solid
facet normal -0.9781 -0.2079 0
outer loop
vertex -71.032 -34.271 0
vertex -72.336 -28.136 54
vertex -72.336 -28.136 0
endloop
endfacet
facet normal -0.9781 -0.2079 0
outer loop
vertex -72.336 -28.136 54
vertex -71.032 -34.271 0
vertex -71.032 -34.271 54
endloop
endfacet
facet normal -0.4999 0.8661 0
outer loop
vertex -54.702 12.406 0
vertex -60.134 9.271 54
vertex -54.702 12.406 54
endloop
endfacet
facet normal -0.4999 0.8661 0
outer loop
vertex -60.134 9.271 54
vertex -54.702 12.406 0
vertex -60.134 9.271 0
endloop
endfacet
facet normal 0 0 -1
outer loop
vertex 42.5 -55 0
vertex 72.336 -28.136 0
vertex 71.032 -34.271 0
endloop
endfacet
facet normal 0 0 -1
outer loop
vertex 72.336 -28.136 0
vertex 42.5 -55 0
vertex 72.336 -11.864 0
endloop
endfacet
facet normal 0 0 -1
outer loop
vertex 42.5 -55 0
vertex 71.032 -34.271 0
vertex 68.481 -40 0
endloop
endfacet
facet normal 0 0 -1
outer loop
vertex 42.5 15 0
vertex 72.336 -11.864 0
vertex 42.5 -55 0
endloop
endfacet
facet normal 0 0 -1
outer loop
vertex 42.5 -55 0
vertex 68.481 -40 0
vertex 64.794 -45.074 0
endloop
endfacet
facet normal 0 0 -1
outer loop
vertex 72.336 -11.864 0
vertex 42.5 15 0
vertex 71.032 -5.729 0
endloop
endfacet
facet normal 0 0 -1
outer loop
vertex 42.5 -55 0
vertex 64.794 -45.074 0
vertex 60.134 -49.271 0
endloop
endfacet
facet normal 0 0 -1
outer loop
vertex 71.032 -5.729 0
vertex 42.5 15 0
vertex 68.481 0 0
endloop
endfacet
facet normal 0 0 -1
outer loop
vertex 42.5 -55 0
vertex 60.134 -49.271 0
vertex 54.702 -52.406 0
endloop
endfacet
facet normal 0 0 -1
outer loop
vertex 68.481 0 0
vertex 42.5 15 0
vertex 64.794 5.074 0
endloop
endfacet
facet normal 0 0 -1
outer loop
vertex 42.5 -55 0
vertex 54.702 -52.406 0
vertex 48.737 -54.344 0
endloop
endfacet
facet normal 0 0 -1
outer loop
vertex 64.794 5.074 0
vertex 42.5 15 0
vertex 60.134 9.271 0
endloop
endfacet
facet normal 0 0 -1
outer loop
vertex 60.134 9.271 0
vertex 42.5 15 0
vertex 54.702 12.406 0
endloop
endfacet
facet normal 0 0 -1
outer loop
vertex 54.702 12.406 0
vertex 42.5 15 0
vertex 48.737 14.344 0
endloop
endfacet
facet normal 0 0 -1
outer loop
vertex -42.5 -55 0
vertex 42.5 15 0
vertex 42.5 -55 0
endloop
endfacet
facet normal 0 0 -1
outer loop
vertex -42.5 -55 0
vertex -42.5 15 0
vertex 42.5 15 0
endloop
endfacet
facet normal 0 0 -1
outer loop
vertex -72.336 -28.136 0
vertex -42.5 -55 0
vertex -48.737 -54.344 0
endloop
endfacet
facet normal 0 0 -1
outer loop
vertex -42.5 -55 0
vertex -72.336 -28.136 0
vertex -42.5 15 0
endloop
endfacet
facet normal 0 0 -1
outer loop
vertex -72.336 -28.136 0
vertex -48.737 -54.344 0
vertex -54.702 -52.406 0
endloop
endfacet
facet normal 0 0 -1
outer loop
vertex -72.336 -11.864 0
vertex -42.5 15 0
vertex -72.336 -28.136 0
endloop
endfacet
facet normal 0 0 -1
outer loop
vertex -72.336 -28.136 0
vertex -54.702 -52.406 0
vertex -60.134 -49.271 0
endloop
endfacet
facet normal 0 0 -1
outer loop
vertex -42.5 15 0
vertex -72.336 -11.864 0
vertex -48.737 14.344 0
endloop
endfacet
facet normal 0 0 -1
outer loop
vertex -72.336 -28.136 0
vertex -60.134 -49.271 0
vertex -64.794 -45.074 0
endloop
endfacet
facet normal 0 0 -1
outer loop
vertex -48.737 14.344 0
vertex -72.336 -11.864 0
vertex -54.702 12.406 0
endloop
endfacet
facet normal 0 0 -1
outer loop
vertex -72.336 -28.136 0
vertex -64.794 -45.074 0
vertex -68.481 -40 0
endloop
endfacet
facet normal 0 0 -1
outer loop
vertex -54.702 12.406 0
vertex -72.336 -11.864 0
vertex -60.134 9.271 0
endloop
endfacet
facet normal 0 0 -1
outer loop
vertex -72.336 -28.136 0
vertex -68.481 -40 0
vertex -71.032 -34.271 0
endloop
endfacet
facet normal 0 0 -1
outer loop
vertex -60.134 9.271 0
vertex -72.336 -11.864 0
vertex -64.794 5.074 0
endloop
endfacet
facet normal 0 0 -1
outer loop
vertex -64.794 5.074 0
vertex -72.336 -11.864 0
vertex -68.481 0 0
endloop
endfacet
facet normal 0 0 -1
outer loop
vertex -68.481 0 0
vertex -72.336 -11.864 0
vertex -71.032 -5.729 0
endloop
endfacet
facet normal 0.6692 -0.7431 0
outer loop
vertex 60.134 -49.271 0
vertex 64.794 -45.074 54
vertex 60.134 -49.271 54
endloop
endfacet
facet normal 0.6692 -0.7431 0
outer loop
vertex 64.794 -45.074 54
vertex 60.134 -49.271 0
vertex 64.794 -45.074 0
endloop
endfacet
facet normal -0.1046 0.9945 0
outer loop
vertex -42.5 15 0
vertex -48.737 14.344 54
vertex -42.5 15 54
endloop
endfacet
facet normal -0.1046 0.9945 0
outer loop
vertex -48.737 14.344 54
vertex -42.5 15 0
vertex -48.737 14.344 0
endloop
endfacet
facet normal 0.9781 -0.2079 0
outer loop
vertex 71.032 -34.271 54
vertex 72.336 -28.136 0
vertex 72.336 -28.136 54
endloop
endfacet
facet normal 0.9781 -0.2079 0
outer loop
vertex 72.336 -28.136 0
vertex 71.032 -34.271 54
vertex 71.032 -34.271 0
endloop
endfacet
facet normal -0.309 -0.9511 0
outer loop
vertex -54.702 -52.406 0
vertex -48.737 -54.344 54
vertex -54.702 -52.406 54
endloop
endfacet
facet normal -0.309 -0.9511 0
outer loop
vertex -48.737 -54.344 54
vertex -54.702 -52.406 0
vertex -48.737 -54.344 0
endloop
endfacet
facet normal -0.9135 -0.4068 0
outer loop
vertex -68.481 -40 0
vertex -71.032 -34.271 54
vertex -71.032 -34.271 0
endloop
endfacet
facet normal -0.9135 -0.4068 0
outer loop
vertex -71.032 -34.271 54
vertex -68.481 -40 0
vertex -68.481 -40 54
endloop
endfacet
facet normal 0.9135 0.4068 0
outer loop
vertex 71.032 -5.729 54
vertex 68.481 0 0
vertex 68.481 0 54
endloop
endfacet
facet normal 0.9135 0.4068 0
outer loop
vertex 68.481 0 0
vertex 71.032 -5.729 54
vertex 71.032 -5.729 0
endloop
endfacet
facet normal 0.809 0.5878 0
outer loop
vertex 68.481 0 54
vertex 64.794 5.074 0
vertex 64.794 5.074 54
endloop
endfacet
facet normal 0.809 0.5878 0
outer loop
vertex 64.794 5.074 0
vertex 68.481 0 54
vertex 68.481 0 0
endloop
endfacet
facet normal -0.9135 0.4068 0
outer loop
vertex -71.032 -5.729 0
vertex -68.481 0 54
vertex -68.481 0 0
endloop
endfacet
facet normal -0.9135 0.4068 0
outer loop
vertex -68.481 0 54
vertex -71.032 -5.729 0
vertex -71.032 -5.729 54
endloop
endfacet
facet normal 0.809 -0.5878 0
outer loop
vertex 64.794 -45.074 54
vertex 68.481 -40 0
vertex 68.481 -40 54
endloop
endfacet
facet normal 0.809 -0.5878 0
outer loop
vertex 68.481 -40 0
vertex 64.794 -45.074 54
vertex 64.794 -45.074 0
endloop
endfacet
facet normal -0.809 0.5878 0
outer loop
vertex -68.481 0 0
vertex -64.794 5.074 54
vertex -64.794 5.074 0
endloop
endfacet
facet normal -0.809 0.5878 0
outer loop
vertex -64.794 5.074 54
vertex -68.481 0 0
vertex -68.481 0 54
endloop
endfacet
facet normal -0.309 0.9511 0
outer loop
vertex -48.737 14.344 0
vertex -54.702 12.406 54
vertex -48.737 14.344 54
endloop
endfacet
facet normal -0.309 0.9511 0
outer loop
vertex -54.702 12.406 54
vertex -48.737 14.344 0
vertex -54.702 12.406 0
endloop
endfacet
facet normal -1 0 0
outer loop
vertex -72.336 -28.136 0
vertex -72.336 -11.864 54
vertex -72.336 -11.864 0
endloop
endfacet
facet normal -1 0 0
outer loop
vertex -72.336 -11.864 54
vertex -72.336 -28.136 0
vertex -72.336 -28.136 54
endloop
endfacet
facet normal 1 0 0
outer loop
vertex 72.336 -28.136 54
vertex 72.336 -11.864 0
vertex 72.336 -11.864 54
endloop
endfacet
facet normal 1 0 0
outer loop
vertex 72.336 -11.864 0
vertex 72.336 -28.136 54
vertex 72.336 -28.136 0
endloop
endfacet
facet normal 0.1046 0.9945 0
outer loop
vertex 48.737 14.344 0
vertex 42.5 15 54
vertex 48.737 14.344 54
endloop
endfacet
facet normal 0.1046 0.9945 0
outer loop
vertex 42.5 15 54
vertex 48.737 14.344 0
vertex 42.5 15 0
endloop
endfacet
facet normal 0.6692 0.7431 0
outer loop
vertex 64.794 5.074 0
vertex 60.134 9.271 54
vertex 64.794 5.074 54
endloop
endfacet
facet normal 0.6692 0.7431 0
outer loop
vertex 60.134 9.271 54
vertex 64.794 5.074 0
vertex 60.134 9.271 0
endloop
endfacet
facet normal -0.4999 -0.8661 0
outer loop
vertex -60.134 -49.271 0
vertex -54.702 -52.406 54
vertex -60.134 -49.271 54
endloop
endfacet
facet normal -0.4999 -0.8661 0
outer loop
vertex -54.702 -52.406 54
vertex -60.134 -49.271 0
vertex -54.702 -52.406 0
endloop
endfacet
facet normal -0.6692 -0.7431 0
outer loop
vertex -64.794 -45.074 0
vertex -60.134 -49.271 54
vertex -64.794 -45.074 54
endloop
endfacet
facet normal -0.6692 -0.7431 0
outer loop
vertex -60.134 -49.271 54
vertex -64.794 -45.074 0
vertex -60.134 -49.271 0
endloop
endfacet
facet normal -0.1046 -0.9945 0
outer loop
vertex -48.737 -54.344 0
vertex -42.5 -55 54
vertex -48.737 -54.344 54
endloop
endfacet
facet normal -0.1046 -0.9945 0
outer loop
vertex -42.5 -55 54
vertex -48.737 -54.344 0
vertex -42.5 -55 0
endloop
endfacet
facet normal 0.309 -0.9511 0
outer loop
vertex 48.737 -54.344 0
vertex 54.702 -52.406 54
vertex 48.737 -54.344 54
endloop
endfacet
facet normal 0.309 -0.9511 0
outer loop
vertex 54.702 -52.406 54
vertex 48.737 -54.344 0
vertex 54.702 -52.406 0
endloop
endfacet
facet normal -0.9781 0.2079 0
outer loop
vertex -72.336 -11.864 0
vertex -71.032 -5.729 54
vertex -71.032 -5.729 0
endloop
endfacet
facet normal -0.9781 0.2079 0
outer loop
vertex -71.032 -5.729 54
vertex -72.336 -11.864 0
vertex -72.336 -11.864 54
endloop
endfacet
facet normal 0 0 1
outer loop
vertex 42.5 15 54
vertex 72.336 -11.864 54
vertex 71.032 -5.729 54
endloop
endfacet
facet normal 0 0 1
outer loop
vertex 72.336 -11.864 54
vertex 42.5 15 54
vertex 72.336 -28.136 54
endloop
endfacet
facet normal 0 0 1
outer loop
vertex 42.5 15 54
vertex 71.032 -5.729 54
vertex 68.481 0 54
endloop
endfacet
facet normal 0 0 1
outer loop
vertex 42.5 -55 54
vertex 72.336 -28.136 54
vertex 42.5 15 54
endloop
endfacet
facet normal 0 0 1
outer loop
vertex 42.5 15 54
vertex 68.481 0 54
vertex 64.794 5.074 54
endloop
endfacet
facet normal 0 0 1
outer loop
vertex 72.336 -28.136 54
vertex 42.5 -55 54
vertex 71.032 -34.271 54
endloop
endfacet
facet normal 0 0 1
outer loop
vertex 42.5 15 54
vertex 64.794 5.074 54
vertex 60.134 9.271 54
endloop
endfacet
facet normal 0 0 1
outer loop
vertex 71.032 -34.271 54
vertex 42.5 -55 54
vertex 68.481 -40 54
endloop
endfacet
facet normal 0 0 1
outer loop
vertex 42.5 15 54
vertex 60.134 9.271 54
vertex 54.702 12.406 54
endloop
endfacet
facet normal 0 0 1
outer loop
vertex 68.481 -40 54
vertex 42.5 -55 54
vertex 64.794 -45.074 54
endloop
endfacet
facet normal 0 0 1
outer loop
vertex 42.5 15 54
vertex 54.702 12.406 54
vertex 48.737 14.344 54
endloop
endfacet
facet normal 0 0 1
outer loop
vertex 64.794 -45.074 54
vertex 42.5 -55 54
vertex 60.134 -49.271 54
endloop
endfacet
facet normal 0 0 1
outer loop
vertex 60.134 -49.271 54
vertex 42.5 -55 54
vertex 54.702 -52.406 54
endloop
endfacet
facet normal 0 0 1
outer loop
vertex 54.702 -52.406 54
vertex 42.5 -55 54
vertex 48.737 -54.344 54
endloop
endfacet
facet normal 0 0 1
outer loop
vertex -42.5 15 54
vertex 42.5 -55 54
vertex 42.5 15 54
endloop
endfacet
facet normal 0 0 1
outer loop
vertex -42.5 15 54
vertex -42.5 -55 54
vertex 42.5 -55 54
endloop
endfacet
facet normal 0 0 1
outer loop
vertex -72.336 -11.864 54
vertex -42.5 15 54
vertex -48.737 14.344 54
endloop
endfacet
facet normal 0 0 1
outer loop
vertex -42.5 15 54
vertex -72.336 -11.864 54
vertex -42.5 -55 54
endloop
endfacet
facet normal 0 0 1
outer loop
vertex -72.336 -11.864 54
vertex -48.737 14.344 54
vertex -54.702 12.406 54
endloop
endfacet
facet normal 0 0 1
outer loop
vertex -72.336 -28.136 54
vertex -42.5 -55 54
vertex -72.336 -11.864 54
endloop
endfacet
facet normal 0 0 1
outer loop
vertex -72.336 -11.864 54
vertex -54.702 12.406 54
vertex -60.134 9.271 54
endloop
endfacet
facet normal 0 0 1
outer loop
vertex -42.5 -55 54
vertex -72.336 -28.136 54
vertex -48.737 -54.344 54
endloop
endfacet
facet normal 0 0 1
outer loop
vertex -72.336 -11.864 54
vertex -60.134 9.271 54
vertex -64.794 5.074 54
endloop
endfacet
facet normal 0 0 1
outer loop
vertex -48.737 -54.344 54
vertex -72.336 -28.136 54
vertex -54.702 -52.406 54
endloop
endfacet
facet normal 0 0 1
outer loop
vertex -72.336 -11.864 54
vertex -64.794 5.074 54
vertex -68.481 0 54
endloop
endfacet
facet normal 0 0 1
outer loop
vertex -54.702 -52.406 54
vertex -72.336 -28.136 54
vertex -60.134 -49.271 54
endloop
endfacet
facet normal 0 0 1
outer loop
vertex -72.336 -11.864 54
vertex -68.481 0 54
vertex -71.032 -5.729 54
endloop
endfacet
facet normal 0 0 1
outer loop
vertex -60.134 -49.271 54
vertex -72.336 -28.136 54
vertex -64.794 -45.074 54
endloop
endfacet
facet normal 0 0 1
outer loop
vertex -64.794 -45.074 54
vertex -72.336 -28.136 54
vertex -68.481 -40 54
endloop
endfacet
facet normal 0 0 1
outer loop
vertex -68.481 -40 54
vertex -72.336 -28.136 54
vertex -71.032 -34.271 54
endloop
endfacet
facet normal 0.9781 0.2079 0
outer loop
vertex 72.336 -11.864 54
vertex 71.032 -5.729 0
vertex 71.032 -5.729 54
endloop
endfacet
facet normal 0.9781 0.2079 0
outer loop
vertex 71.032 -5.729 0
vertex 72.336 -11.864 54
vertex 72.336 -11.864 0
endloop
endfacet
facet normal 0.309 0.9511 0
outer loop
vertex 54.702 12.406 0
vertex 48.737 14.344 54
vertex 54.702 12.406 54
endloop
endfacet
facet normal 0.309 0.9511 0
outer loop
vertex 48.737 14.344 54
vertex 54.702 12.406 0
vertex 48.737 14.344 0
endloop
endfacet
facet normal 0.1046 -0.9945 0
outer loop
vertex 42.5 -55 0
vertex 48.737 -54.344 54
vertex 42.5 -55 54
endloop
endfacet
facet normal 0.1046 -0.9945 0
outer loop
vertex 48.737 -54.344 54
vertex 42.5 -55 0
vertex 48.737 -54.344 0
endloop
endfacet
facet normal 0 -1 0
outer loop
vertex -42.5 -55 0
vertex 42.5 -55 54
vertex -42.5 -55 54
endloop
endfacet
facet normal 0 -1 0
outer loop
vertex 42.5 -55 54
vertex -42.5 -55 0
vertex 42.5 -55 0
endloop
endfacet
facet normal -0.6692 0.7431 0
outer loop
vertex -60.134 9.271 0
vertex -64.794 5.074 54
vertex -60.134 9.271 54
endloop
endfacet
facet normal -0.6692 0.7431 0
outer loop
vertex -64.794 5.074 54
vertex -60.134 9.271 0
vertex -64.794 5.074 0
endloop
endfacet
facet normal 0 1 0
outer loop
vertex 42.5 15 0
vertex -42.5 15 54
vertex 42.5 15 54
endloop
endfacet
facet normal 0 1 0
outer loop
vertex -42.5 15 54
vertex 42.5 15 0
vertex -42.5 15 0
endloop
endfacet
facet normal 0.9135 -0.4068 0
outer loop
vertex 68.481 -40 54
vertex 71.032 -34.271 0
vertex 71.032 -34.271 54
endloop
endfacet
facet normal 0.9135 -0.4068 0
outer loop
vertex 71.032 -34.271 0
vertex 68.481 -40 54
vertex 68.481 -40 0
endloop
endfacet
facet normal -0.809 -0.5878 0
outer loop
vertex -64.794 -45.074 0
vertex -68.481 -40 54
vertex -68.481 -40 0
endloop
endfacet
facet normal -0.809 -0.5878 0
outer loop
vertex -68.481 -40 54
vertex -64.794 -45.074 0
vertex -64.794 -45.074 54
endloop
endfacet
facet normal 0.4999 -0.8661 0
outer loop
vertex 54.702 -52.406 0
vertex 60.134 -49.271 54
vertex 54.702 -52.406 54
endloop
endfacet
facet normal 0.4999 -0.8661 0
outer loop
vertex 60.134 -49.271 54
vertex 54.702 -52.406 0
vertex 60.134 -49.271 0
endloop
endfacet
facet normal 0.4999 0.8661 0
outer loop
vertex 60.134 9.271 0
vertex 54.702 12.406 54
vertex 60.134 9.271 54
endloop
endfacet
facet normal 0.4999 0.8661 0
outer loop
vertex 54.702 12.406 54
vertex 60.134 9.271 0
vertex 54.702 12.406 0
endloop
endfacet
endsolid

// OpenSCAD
/* https://edux.fit.cvut.cz/courses/BI-3DT/classification/openscad-ukol */
/* https://github.com/nesro/nesrotom-3dt-2015 */
/* nesrotom@fit.cvut.cz */

/* comment this out before submission! */
//$fn = 10;

/******************************************************/

/* 1D offset wasn't a good idea */
/*
module line(x) {
    difference() {
    square([x,1],center=true);
    translate([0,0.5,0])
        square([x+0.5,2],center=true);
    }
}
offset(r=+3)
line(10);*/

/* TOHLE NEPOUZIVAM */
/* rounded cube: square + offset + extrude */
/* tohle ale nemuzu pouzit, protoze to nefunguje kdyz je
   y = 0 */
module rcSOE(x,y,z,r) {
    echo("rcSOE x=",x,",\ty=",y,",\tz=",z,",\tr=",r);
    %cube([x+2*r,y+2*r,z], center=true);
    linear_extrude(height=z,center=true,convexity=0,twist=0)
    offset(r=+r)
    square([x,y],center=true);
}

/* TOHLE POUZIVAM (a budu pokud y==0 */
/* rounded cube: 4 cylinders + hull */
module rc4CH(x,y,z,r) {
    echo("rc4CH x=",x,",\ty=",y,",\tz=",z,",\tr=",r);
    %cube([x+2*r,y+2*r,z], center=true);
    hull() {
        for (i=[-1,1])
            for (j=[-1,1])
                translate([(i*x/2),(j*y/2),0]) 
                    cylinder(r=r, h=z, center=true);
    }
}

/* TOHLE ZATIM NEPOUZIVAM */
/* rounded cube: 2 cylinders + cube (WIP!!!) */
module rc2CC(x,y,z,r) {
    echo("rc2CC x=",x,",\ty=",y,",\tz=",z,",\tr=",r);
    %cube([x+2*r,y+2*r,z], center=true);
    
    //d=z+r;
    //cylinder(r=d, h=z, center=true);
    
    cube([x+2*r,y,z], center=true);
    
    color("red")
    translate([0,x+2*r,0]) //FIXME
    cylinder(r=r, h=z, center=true);
    
}

module rc(x,y,z,r) {
    rc4CH(x,y,z,r);
}

/* one card holder */
module ch(x,y,z,s,t,down,v) {
    difference(){
        color("blue")rc(z,x,y,s+t);
        color("red")rc(z,x,y,s);
    }
    //translate([0,0,(-y/2) +t/2 - down/2 + ((y*v)/2)])
    //rc(z,x,t+down+(y*v),s+t);
}

module draw_cardholder(x,y,z,t,s,c,d,v) {
    XXX = d < 0 ? d*c : 0;
    // black magic. done with the great trial and error techinque
    to_center = c == 1 ? -((z+s+t+s)/1) : -((t+t+c*(z+s+s+t))/2);
    rotate([0,0,270]) //natoc aby  to bylo jako na eduxu
    translate([to_center,0,0]) //posun do prosted x
    for (a=[1:c]) { //pro kazdou kartu
        translate([a*t*2,0,a*d-XXX]) //pousun o delta
        translate([0,0,(y)/2]) //na osu z
        ch(x,y,z,s,t,a*d-XXX,v); //jeden drzacek na kartu
    }
}

module cardholder(
    size=[85, 54, 1],
    thickness=3,
    spacing=1,
    cards=4,
    delta=25,
    visibility=0.3)
{
    /* i wrote this code after a lot of updog */
    draw = (len(size) < 2 || size[0] <= 0 ||
            size[1] <= 0 || cards <= 0) ? false : true;
    visibility = (visibility < 0) ? 0 : (1 < visibility) ? 1 : visibility;
    thickness = (thickness < 0) ? 0 : thickness;
    spacing = (spacing < 0) ? 0 : spacing;
    size = len(size) == 2 ? concat(size, 0) : size;
    
    echo("draw",draw,"visibility",visibility,"thickness",thickness,
        "spacing",spacing,"size",size);
    
    /* i need shortcuts because i have a small screen */
    x = size[0];
    y = size[1];
    z = size[2];   
    s = spacing;
    t = thickness;
    c = cards;
    d = -delta;
    v = visibility;
    
    if (draw) {
        draw_cardholder(x,y,z,t,s,c,d,v);
    }
}

/******************************************************/
/* tests */
test_no = 10;

if (test_no == 1) {
    cardholder();
    echo("TEST #1: edux default <<<<<");
}

if (test_no == 2) {
    cardholder(size=[85, 54, 1], thickness=3, spacing=1, cards=4, delta=25, visibility=0.3);
    echo("TEST #2: edux default copied <<<<<");
}

if (test_no == 3) {
    cardholder(size=[90, 70, 4], thickness=3, spacing=1, cards=4, delta=25, visibility=0.3);
    echo("TEST #3: edux slightly different size <<<<<");
}

if (test_no == 4) {
    cardholder(size=[90, 70, 4], thickness=5, spacing=3, cards=6, delta=10, visibility=0.5);
    echo("TEST #4: edux slightly different size and rest <<<<<");
}

if (test_no == 5) {
    cardholder(size=[666], thickness=3, spacing=1, cards=4, delta=25, visibility=0.3);
    echo("TEST #5: vector has only 1 item <<<<<");
    echo("TEST #5: NOTHIG SHALL BE GENERATED! <<<<<");
}

if (test_no == 6) {
    cardholder(size=[85, 54], thickness=3, spacing=1, cards=4, delta=25, visibility=0.3);
    echo("TEST #6: vector has only 2 item <<<<<");
}

if (test_no == 7) {
    cardholder(size=[0, 54, 1], thickness=3, spacing=1, cards=4, delta=25, visibility=0.3);
    echo("TEST #7: size[0] == 0 <<<<<");
    echo("TEST #7: NOTHIG SHALL BE GENERATED! <<<<<");
}

if (test_no == 8) {
    cardholder(size=[85, 0, 1], thickness=3, spacing=1, cards=4, delta=25, visibility=0.3);
    echo("TEST #8: size[1] == 0 <<<<<");
    echo("TEST #8: NOTHIG SHALL BE GENERATED! <<<<<");
}

if (test_no == 9) {
    cardholder(size=[85, 54, 1], thickness=3, spacing=1, cards=0, delta=25, visibility=0.3);
    echo("TEST #9: cards == 0 <<<<<");
    echo("TEST #9: NOTHIG SHALL BE GENERATED! <<<<<");
}

if (test_no == 10) {
    cardholder(size=[85, 54, 10], thickness=30, spacing=-3, cards=1, delta=25, visibility=0.3);
    echo("TEST #10: spacing < 0 <<<<<");
}

if (test_no == 11) {
    cardholder(size=[85, 54, 1], thickness=3, spacing=1, cards=4, delta=0, visibility=0.3);
    echo("TEST #11: delta == 0 <<<<<");
}

if (test_no == 12) {
    cardholder(size=[85, 54, 1], thickness=3, spacing=1, cards=4, delta=-25, visibility=0.3);
    echo("TEST #12: delta = -delta <<<<<");
}

if (test_no == 13) {
    cardholder(size=[85, 54, 1], thickness=3, spacing=1, cards=4, delta=25, visibility=-2);
    echo("TEST #13: visibility = -2 <<<<<");
}

if (test_no == 14) {
    cardholder(size=[85, 54, 1], thickness=3, spacing=1, cards=4, delta=25, visibility=2);
    echo("TEST #14: visibility = 2 <<<<<");
}

if (test_no == 15) {
    cardholder(size=[85, 54, 1], thickness=3, spacing=1, cards=1, delta=25, visibility=0.3);
    echo("TEST #15: only 1 card <<<<<");
}

if (test_no == 16) {
    cardholder(size=[85, 54, 1], thickness=3, spacing=1, cards=10, delta=25, visibility=0.3);
    echo("TEST #16: 10 cards <<<<<");
}

if (test_no == 17) {
    cardholder(size=[85, 54, 1], thickness=3, spacing=1, cards=50, delta=25, visibility=0.3);
    echo("TEST #17: 50 cards <<<<<");
}

if (test_no == 18) {
    cardholder(size=[85, 54, 1], thickness=3, spacing=1, cards=2, delta=25, visibility=0.3);
    echo("TEST #18: 2 cards <<<<<");
}
